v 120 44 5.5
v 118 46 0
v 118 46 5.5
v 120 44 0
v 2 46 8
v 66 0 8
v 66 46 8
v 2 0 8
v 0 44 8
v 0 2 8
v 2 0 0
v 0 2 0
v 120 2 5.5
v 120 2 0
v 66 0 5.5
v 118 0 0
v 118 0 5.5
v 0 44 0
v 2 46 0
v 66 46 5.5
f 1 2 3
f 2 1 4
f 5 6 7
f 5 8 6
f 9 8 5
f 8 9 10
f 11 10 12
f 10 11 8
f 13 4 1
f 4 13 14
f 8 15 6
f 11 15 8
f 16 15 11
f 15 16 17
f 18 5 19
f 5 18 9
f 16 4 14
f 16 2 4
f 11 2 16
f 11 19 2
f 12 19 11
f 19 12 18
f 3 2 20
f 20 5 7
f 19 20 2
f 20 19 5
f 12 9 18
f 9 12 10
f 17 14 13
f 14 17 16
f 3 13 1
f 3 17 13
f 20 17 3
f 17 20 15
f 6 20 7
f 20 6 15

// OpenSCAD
$fn = 32;

// ----------------------------------------------------------------------
// Stepped bar: endstep, 120 x 46 x 8/5.5 mm
// ----------------------------------------------------------------------

// --- parameters (mm) ---
bar_l = 120;              // bar length, X
bar_w = 46;               // bar width, Y
plate_t = 8;              // thickness of the thick zone, Z
thin_t = 5.5;             // thickness of the thin zone
corner_c = 2;             // corner chamfer of the bar
step_cut = 2.5;           // material removed from the thin zone
step_x = 66;              // step position from the left end
depth_1 = 2.5;            // depth of cut 1 from the top face

profile = [[2, 0], [118, 0], [120, 2], [120, 44], [118, 46], [2, 46], [0, 44], [0, 2]];  // primary outline, 8 points, counter clockwise
void_1 = [[66, -1], [121, -1], [121, 47], [66, 47]];  // thin zone beyond the step, 4 points

// --- the one profile operation ---
difference() {
  linear_extrude(height = plate_t) polygon(points = profile);
  translate([0, 0, plate_t - depth_1])
    linear_extrude(height = depth_1 + 1) polygon(points = void_1);
}
